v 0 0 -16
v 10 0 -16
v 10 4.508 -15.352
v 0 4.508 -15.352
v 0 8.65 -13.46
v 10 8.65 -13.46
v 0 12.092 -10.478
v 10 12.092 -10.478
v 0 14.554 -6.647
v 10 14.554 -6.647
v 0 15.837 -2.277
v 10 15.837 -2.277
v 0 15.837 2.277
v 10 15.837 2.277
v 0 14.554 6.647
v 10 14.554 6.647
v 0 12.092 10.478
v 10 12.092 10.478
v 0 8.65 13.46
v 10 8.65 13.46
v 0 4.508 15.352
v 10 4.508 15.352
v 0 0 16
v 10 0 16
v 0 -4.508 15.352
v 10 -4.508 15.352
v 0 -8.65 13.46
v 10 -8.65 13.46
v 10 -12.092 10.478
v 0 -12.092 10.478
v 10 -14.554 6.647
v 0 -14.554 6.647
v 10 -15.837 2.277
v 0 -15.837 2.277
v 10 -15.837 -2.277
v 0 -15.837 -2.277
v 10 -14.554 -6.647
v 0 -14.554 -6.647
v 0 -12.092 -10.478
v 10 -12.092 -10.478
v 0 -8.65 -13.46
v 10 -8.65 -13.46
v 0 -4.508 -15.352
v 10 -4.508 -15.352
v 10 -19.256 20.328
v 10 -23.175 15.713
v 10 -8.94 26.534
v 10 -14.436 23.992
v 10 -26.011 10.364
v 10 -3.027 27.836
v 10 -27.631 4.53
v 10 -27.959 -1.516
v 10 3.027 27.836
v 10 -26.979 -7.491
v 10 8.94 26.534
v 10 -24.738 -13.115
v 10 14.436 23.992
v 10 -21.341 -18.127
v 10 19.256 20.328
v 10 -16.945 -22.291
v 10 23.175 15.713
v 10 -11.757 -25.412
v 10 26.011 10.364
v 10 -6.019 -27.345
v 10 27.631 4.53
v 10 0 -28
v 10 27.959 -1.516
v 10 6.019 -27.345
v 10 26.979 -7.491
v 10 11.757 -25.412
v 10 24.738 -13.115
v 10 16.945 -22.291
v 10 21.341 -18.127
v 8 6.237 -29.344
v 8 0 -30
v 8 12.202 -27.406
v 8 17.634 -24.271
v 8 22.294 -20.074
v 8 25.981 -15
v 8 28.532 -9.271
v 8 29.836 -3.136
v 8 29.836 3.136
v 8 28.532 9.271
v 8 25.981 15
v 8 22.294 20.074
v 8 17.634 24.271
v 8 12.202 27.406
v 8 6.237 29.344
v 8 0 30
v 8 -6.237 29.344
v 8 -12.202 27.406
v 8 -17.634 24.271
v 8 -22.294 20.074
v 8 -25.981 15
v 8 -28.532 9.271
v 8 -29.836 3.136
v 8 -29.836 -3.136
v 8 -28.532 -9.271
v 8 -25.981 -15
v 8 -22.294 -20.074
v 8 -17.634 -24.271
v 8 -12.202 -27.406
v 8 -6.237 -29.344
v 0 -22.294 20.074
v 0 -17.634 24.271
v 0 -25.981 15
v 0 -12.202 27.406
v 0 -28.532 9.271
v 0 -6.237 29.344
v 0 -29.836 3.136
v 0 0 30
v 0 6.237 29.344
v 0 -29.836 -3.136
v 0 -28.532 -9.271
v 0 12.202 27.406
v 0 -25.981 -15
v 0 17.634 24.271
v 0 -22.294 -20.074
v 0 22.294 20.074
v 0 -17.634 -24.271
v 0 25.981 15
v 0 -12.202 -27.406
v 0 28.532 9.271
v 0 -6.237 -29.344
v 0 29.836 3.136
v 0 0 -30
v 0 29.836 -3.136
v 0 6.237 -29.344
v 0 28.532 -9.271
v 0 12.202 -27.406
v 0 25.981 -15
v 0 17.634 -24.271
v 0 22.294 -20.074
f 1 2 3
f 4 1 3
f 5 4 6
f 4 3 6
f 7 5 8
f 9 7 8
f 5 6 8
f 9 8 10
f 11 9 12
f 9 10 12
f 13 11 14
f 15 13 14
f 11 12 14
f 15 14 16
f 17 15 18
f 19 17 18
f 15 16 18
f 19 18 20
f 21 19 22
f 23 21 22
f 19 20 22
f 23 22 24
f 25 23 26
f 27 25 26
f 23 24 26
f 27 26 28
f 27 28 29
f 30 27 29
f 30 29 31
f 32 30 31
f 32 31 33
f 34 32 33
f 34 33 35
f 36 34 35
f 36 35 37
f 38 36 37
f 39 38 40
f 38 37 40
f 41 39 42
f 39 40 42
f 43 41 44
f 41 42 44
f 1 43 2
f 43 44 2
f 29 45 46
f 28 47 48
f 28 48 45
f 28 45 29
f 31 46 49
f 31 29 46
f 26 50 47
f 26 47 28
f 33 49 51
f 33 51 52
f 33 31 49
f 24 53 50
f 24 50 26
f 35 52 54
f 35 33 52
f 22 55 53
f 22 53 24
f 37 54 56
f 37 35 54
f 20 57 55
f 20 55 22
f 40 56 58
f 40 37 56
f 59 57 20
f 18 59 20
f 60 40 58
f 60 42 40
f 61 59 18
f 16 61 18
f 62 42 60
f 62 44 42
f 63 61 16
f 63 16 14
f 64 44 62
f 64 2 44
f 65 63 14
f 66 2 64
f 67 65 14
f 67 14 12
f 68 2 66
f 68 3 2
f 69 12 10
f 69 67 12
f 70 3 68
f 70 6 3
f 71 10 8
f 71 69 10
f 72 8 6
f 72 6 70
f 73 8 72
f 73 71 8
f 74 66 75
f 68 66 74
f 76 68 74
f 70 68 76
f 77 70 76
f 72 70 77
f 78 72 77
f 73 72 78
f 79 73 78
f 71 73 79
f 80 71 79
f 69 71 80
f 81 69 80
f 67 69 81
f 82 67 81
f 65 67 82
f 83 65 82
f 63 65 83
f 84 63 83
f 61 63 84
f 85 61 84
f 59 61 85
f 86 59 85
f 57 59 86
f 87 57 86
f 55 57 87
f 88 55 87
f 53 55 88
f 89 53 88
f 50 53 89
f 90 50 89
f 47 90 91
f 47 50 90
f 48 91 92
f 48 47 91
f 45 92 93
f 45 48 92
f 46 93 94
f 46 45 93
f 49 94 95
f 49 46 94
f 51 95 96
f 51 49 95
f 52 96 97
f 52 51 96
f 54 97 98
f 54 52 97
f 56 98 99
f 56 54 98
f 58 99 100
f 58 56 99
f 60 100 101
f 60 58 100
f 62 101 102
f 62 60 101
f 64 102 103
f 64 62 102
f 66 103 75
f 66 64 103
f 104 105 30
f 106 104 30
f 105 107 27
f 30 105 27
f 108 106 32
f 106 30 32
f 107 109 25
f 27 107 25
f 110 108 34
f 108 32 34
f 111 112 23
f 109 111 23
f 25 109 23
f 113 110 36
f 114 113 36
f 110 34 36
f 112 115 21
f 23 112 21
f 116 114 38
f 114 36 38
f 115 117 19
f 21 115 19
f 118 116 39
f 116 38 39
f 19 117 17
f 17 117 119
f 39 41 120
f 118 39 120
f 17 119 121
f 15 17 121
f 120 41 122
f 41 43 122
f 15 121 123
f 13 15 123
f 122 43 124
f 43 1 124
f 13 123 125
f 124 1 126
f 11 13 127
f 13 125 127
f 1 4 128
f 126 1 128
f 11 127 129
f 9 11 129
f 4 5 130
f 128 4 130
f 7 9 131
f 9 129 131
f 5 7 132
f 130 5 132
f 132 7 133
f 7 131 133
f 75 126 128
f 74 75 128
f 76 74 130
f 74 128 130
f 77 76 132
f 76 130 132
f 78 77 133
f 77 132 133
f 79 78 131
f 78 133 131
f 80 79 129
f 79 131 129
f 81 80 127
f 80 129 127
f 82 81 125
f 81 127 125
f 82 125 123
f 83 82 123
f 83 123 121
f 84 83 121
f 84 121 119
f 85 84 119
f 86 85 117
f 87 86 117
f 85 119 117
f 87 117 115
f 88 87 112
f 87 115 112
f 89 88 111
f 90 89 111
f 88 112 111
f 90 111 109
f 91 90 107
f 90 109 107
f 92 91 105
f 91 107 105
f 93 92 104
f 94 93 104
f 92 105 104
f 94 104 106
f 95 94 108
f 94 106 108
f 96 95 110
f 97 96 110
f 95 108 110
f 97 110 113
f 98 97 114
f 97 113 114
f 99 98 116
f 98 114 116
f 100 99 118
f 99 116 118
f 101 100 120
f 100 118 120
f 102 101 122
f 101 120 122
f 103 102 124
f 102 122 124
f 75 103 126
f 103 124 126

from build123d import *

# Parameters (mm, degrees)
SKETCH2_R           = 30
BOSS_EXTRUDE1_DEPTH = 10
CHAMFER1_SIZE       = 2
SKETCH3_R           = 16
CUT_EXTRUDE1_DEPTH  = 10


with BuildPart() as part:
    # Sketch2 → Boss-Extrude1 (new body)
    with BuildSketch(Plane(origin=(0, 0, 0), x_dir=(0, 0, -1), z_dir=(1, 0, 0))):
        Circle(SKETCH2_R)
    extrude(amount=BOSS_EXTRUDE1_DEPTH)

    # Chamfer1
    chamfer1_edges = [part.edges().sort_by_distance(p)[0] for p in [
        (10, 0, 30),
    ]]
    chamfer(chamfer1_edges, length=CHAMFER1_SIZE)

    # Sketch3 → Cut-Extrude1 (cut)
    with BuildSketch(Plane(origin=(10, 0, 0), x_dir=(0, 0, -1), z_dir=(1, 0, 0))):
        Circle(SKETCH3_R)
    extrude(amount=-CUT_EXTRUDE1_DEPTH, mode=Mode.SUBTRACT)


solid = part.part
